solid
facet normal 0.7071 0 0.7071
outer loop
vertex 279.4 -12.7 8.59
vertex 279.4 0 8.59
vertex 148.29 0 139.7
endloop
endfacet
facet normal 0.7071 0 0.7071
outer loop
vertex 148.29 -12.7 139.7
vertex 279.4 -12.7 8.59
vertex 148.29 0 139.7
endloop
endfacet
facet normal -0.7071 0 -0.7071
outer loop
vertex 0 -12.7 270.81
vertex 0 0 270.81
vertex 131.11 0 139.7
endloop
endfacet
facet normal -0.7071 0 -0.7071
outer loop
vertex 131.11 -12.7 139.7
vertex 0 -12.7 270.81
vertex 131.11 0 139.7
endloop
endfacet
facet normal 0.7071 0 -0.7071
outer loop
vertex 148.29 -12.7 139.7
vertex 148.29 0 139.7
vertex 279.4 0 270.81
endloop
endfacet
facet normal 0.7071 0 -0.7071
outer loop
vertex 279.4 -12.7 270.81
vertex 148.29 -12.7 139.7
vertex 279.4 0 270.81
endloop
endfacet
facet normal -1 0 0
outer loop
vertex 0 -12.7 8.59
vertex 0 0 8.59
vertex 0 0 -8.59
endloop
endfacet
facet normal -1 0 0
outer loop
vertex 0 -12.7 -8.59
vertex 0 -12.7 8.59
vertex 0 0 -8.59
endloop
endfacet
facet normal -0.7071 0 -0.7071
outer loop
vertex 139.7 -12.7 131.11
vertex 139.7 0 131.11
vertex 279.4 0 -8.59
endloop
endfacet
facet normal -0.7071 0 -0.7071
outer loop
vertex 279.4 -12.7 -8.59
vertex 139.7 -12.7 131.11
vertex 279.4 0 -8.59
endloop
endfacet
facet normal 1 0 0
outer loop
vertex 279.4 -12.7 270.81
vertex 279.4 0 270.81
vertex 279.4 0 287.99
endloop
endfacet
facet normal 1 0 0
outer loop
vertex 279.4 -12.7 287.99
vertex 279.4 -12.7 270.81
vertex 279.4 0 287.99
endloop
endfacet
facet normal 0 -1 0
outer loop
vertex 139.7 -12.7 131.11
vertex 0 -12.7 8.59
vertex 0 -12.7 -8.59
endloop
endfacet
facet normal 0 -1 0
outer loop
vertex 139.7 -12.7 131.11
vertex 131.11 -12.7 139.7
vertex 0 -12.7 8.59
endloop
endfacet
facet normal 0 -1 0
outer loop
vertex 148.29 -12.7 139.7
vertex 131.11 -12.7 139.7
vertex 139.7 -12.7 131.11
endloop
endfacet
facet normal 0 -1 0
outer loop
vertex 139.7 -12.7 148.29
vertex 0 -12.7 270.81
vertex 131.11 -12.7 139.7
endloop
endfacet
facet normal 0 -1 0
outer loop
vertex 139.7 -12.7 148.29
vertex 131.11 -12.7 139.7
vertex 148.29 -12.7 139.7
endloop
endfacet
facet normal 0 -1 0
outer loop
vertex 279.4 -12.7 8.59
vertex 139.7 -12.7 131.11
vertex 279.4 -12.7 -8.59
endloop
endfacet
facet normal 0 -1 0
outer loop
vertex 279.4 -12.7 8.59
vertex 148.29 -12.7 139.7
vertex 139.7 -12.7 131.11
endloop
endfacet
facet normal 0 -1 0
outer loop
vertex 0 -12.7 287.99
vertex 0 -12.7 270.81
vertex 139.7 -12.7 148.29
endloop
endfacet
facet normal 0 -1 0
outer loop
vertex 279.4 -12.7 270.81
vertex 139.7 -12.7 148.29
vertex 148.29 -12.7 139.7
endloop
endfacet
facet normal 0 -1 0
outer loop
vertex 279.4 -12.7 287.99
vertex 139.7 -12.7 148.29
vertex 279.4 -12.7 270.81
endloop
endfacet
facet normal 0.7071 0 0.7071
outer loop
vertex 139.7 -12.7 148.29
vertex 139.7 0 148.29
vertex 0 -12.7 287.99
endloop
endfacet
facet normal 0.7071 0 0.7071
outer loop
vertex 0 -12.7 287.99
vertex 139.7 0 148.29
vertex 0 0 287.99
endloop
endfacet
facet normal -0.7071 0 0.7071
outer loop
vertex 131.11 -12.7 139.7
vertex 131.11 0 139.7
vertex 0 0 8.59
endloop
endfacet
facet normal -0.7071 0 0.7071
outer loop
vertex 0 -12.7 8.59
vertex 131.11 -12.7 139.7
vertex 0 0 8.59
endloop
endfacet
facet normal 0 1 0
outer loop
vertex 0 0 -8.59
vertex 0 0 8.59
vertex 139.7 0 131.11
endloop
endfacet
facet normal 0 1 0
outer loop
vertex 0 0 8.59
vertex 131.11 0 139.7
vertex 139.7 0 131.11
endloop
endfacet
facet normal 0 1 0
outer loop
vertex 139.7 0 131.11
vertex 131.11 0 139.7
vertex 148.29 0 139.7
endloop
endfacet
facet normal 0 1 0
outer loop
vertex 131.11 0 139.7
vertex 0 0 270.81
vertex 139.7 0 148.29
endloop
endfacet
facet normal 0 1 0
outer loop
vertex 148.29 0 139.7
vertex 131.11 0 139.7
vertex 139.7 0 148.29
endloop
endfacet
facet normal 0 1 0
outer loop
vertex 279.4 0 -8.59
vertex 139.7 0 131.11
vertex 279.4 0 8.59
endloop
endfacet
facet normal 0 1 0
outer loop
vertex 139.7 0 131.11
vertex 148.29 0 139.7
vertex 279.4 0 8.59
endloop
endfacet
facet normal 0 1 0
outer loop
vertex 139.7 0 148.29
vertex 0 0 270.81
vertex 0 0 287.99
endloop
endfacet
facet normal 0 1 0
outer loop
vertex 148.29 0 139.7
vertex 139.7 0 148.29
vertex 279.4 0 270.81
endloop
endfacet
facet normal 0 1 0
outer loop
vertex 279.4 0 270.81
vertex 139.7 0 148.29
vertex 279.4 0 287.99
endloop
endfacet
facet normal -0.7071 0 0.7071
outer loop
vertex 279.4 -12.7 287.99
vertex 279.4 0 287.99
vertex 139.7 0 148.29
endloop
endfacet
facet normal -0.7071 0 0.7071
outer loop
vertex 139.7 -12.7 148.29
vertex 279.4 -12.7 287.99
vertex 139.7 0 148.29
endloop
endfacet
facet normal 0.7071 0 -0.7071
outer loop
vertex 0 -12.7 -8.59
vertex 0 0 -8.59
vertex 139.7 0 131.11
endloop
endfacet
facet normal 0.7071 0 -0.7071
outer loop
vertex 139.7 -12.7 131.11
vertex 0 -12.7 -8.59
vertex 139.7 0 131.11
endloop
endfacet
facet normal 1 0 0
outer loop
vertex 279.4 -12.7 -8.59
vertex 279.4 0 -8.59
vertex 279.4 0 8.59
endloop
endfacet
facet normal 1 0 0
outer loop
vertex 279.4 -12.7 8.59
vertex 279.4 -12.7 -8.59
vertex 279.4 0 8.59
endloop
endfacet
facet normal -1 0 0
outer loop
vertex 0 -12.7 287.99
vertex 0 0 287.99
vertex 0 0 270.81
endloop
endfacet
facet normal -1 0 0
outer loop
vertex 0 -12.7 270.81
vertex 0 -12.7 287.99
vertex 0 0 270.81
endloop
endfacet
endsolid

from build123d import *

# Parameters (mm, degrees)
F1_DEPTH = 12.7


with BuildPart() as f1:
    # F0 (on Front) → F1 (new body)
    with BuildSketch(Plane.XZ):
        Polygon((0, 8.5898101), (0, 0), (135.4050932787, 135.4050932787), (131.1101882287, 139.6999983287), align=None)
        Polygon((135.4050932787, 135.4050932787), (0, 0), (0, -8.5898101), (8.5898101, 0), (139.6999983287, 131.1101882287), align=None)
        Polygon((131.1101882287, 139.6999983287), (135.4050932787, 135.4050932787), (139.6999983287, 139.6999983287), (135.4050932787, 143.9949033787), align=None)
        Polygon((139.6999983287, 139.6999983287), (135.4050932787, 135.4050932787), (139.6999983287, 131.1101882287), (143.9949033787, 135.4050932787), align=None)
        Polygon((0, 270.8101865575), (131.1101882287, 139.6999983287), (135.4050932787, 143.9949033787), (0, 279.3999966575), align=None)
        Polygon((143.9949033787, 143.9949033787), (139.6999983287, 139.6999983287), (143.9949033787, 135.4050932787), (148.2898084287, 139.6999983287), align=None)
        Polygon((135.4050932787, 143.9949033787), (139.6999983287, 139.6999983287), (143.9949033787, 143.9949033787), (139.6999983287, 148.2898084287), align=None)
        Polygon((143.9949033787, 135.4050932787), (139.6999983287, 131.1101882287), (270.8101865575, 0), (279.3999966575, -8.5898101), (279.3999966575, 0), align=None)
        Polygon((0, 279.3999966575), (135.4050932787, 143.9949033787), (139.6999983287, 148.2898084287), (4.29490505, 283.6949017075), (0, 287.9898067575), align=None)
        Polygon((148.2898084287, 139.6999983287), (143.9949033787, 135.4050932787), (279.3999966575, 0), (279.3999966575, 8.5898101), align=None)
        Polygon((139.6999983287, 148.2898084287), (143.9949033787, 143.9949033787), (279.3999966575, 279.3999966575), (279.3999966575, 287.9898067575), (275.1050916075, 283.6949017075), align=None)
        Polygon((279.3999966575, 279.3999966575), (143.9949033787, 143.9949033787), (148.2898084287, 139.6999983287), (279.3999966575, 270.8101865575), align=None)
    extrude(amount=F1_DEPTH)


solid = f1.part
